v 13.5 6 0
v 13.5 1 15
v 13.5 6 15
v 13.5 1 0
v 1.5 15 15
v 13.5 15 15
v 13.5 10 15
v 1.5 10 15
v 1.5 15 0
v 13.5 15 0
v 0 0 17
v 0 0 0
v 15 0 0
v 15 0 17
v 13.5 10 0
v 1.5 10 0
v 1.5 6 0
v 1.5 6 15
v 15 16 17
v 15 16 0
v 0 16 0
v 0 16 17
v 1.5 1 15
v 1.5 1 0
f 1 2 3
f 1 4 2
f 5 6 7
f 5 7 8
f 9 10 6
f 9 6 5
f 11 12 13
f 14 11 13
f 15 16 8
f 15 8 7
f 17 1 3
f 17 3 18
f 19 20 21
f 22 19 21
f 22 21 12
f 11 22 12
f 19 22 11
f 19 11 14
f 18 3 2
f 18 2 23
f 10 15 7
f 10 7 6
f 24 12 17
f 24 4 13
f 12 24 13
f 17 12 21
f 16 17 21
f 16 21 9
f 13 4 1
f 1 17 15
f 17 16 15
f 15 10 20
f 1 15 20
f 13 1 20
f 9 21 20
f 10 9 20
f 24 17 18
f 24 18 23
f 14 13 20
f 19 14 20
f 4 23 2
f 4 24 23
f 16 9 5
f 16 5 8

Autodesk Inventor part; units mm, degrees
ref_plane "YZ Plane" through (0, 0, 0) normal (1, 0, 0) x (0, 1, 0)
ref_plane "XZ Plane" through (0, 0, 0) normal (0, 1, 0) x (-1, 0, 0)
ref_plane "XY Plane" through (0, 0, 0) normal (0, 0, 1) x (1, 0, 0)
sketch "Sketch1" plane through (0, 0, 0) normal (0, 0, 1) x (1, 0, 0)
  line L0 (0, 0) -> (15, 0)
  line L1 (15, 0) -> (15, 16)
  line L2 (15, 16) -> (0, 16)
  line L3 (0, 16) -> (0, 0)
  dimension "d0" = 15
  dimension "d1" = 16
extrude "Extrusion1" add sketch "Sketch1" along normal blind 17
sketch "Esquisse2" plane through (0, 0, 0) normal (0, 0, -1) x (-1, 0, 0)
  line L0 (0, 0) -> (-15, 0) construction
  line L1 (0, 16) -> (0, 0) construction
  line L2 (-15, 16) -> (0, 16) construction
  line L3 (-15, 0) -> (-15, 16) construction
  line L4 (-13.5, 15) -> (-1.5, 15)
  line L5 (-1.5, 15) -> (-1.5, 10)
  line L6 (-1.5, 10) -> (-13.5, 10)
  line L7 (-13.5, 10) -> (-13.5, 15)
  line L8 (-13.5, 6) -> (-1.5, 6)
  line L9 (-1.5, 6) -> (-1.5, 1)
  line L10 (-1.5, 1) -> (-13.5, 1)
  line L11 (-13.5, 1) -> (-13.5, 6)
  line L12 (-7.5, 0) -> (-7.5, 16) construction
  dimension "d4" = 12
  dimension "d5" = 5
  dimension "d6" = 5
  dimension "d7" = 1
  dimension "d8" = 4
extrude "Extrusion2" cut sketch "Esquisse2" against normal blind 15
properties part number "R001" material "Acier / Stahl"
